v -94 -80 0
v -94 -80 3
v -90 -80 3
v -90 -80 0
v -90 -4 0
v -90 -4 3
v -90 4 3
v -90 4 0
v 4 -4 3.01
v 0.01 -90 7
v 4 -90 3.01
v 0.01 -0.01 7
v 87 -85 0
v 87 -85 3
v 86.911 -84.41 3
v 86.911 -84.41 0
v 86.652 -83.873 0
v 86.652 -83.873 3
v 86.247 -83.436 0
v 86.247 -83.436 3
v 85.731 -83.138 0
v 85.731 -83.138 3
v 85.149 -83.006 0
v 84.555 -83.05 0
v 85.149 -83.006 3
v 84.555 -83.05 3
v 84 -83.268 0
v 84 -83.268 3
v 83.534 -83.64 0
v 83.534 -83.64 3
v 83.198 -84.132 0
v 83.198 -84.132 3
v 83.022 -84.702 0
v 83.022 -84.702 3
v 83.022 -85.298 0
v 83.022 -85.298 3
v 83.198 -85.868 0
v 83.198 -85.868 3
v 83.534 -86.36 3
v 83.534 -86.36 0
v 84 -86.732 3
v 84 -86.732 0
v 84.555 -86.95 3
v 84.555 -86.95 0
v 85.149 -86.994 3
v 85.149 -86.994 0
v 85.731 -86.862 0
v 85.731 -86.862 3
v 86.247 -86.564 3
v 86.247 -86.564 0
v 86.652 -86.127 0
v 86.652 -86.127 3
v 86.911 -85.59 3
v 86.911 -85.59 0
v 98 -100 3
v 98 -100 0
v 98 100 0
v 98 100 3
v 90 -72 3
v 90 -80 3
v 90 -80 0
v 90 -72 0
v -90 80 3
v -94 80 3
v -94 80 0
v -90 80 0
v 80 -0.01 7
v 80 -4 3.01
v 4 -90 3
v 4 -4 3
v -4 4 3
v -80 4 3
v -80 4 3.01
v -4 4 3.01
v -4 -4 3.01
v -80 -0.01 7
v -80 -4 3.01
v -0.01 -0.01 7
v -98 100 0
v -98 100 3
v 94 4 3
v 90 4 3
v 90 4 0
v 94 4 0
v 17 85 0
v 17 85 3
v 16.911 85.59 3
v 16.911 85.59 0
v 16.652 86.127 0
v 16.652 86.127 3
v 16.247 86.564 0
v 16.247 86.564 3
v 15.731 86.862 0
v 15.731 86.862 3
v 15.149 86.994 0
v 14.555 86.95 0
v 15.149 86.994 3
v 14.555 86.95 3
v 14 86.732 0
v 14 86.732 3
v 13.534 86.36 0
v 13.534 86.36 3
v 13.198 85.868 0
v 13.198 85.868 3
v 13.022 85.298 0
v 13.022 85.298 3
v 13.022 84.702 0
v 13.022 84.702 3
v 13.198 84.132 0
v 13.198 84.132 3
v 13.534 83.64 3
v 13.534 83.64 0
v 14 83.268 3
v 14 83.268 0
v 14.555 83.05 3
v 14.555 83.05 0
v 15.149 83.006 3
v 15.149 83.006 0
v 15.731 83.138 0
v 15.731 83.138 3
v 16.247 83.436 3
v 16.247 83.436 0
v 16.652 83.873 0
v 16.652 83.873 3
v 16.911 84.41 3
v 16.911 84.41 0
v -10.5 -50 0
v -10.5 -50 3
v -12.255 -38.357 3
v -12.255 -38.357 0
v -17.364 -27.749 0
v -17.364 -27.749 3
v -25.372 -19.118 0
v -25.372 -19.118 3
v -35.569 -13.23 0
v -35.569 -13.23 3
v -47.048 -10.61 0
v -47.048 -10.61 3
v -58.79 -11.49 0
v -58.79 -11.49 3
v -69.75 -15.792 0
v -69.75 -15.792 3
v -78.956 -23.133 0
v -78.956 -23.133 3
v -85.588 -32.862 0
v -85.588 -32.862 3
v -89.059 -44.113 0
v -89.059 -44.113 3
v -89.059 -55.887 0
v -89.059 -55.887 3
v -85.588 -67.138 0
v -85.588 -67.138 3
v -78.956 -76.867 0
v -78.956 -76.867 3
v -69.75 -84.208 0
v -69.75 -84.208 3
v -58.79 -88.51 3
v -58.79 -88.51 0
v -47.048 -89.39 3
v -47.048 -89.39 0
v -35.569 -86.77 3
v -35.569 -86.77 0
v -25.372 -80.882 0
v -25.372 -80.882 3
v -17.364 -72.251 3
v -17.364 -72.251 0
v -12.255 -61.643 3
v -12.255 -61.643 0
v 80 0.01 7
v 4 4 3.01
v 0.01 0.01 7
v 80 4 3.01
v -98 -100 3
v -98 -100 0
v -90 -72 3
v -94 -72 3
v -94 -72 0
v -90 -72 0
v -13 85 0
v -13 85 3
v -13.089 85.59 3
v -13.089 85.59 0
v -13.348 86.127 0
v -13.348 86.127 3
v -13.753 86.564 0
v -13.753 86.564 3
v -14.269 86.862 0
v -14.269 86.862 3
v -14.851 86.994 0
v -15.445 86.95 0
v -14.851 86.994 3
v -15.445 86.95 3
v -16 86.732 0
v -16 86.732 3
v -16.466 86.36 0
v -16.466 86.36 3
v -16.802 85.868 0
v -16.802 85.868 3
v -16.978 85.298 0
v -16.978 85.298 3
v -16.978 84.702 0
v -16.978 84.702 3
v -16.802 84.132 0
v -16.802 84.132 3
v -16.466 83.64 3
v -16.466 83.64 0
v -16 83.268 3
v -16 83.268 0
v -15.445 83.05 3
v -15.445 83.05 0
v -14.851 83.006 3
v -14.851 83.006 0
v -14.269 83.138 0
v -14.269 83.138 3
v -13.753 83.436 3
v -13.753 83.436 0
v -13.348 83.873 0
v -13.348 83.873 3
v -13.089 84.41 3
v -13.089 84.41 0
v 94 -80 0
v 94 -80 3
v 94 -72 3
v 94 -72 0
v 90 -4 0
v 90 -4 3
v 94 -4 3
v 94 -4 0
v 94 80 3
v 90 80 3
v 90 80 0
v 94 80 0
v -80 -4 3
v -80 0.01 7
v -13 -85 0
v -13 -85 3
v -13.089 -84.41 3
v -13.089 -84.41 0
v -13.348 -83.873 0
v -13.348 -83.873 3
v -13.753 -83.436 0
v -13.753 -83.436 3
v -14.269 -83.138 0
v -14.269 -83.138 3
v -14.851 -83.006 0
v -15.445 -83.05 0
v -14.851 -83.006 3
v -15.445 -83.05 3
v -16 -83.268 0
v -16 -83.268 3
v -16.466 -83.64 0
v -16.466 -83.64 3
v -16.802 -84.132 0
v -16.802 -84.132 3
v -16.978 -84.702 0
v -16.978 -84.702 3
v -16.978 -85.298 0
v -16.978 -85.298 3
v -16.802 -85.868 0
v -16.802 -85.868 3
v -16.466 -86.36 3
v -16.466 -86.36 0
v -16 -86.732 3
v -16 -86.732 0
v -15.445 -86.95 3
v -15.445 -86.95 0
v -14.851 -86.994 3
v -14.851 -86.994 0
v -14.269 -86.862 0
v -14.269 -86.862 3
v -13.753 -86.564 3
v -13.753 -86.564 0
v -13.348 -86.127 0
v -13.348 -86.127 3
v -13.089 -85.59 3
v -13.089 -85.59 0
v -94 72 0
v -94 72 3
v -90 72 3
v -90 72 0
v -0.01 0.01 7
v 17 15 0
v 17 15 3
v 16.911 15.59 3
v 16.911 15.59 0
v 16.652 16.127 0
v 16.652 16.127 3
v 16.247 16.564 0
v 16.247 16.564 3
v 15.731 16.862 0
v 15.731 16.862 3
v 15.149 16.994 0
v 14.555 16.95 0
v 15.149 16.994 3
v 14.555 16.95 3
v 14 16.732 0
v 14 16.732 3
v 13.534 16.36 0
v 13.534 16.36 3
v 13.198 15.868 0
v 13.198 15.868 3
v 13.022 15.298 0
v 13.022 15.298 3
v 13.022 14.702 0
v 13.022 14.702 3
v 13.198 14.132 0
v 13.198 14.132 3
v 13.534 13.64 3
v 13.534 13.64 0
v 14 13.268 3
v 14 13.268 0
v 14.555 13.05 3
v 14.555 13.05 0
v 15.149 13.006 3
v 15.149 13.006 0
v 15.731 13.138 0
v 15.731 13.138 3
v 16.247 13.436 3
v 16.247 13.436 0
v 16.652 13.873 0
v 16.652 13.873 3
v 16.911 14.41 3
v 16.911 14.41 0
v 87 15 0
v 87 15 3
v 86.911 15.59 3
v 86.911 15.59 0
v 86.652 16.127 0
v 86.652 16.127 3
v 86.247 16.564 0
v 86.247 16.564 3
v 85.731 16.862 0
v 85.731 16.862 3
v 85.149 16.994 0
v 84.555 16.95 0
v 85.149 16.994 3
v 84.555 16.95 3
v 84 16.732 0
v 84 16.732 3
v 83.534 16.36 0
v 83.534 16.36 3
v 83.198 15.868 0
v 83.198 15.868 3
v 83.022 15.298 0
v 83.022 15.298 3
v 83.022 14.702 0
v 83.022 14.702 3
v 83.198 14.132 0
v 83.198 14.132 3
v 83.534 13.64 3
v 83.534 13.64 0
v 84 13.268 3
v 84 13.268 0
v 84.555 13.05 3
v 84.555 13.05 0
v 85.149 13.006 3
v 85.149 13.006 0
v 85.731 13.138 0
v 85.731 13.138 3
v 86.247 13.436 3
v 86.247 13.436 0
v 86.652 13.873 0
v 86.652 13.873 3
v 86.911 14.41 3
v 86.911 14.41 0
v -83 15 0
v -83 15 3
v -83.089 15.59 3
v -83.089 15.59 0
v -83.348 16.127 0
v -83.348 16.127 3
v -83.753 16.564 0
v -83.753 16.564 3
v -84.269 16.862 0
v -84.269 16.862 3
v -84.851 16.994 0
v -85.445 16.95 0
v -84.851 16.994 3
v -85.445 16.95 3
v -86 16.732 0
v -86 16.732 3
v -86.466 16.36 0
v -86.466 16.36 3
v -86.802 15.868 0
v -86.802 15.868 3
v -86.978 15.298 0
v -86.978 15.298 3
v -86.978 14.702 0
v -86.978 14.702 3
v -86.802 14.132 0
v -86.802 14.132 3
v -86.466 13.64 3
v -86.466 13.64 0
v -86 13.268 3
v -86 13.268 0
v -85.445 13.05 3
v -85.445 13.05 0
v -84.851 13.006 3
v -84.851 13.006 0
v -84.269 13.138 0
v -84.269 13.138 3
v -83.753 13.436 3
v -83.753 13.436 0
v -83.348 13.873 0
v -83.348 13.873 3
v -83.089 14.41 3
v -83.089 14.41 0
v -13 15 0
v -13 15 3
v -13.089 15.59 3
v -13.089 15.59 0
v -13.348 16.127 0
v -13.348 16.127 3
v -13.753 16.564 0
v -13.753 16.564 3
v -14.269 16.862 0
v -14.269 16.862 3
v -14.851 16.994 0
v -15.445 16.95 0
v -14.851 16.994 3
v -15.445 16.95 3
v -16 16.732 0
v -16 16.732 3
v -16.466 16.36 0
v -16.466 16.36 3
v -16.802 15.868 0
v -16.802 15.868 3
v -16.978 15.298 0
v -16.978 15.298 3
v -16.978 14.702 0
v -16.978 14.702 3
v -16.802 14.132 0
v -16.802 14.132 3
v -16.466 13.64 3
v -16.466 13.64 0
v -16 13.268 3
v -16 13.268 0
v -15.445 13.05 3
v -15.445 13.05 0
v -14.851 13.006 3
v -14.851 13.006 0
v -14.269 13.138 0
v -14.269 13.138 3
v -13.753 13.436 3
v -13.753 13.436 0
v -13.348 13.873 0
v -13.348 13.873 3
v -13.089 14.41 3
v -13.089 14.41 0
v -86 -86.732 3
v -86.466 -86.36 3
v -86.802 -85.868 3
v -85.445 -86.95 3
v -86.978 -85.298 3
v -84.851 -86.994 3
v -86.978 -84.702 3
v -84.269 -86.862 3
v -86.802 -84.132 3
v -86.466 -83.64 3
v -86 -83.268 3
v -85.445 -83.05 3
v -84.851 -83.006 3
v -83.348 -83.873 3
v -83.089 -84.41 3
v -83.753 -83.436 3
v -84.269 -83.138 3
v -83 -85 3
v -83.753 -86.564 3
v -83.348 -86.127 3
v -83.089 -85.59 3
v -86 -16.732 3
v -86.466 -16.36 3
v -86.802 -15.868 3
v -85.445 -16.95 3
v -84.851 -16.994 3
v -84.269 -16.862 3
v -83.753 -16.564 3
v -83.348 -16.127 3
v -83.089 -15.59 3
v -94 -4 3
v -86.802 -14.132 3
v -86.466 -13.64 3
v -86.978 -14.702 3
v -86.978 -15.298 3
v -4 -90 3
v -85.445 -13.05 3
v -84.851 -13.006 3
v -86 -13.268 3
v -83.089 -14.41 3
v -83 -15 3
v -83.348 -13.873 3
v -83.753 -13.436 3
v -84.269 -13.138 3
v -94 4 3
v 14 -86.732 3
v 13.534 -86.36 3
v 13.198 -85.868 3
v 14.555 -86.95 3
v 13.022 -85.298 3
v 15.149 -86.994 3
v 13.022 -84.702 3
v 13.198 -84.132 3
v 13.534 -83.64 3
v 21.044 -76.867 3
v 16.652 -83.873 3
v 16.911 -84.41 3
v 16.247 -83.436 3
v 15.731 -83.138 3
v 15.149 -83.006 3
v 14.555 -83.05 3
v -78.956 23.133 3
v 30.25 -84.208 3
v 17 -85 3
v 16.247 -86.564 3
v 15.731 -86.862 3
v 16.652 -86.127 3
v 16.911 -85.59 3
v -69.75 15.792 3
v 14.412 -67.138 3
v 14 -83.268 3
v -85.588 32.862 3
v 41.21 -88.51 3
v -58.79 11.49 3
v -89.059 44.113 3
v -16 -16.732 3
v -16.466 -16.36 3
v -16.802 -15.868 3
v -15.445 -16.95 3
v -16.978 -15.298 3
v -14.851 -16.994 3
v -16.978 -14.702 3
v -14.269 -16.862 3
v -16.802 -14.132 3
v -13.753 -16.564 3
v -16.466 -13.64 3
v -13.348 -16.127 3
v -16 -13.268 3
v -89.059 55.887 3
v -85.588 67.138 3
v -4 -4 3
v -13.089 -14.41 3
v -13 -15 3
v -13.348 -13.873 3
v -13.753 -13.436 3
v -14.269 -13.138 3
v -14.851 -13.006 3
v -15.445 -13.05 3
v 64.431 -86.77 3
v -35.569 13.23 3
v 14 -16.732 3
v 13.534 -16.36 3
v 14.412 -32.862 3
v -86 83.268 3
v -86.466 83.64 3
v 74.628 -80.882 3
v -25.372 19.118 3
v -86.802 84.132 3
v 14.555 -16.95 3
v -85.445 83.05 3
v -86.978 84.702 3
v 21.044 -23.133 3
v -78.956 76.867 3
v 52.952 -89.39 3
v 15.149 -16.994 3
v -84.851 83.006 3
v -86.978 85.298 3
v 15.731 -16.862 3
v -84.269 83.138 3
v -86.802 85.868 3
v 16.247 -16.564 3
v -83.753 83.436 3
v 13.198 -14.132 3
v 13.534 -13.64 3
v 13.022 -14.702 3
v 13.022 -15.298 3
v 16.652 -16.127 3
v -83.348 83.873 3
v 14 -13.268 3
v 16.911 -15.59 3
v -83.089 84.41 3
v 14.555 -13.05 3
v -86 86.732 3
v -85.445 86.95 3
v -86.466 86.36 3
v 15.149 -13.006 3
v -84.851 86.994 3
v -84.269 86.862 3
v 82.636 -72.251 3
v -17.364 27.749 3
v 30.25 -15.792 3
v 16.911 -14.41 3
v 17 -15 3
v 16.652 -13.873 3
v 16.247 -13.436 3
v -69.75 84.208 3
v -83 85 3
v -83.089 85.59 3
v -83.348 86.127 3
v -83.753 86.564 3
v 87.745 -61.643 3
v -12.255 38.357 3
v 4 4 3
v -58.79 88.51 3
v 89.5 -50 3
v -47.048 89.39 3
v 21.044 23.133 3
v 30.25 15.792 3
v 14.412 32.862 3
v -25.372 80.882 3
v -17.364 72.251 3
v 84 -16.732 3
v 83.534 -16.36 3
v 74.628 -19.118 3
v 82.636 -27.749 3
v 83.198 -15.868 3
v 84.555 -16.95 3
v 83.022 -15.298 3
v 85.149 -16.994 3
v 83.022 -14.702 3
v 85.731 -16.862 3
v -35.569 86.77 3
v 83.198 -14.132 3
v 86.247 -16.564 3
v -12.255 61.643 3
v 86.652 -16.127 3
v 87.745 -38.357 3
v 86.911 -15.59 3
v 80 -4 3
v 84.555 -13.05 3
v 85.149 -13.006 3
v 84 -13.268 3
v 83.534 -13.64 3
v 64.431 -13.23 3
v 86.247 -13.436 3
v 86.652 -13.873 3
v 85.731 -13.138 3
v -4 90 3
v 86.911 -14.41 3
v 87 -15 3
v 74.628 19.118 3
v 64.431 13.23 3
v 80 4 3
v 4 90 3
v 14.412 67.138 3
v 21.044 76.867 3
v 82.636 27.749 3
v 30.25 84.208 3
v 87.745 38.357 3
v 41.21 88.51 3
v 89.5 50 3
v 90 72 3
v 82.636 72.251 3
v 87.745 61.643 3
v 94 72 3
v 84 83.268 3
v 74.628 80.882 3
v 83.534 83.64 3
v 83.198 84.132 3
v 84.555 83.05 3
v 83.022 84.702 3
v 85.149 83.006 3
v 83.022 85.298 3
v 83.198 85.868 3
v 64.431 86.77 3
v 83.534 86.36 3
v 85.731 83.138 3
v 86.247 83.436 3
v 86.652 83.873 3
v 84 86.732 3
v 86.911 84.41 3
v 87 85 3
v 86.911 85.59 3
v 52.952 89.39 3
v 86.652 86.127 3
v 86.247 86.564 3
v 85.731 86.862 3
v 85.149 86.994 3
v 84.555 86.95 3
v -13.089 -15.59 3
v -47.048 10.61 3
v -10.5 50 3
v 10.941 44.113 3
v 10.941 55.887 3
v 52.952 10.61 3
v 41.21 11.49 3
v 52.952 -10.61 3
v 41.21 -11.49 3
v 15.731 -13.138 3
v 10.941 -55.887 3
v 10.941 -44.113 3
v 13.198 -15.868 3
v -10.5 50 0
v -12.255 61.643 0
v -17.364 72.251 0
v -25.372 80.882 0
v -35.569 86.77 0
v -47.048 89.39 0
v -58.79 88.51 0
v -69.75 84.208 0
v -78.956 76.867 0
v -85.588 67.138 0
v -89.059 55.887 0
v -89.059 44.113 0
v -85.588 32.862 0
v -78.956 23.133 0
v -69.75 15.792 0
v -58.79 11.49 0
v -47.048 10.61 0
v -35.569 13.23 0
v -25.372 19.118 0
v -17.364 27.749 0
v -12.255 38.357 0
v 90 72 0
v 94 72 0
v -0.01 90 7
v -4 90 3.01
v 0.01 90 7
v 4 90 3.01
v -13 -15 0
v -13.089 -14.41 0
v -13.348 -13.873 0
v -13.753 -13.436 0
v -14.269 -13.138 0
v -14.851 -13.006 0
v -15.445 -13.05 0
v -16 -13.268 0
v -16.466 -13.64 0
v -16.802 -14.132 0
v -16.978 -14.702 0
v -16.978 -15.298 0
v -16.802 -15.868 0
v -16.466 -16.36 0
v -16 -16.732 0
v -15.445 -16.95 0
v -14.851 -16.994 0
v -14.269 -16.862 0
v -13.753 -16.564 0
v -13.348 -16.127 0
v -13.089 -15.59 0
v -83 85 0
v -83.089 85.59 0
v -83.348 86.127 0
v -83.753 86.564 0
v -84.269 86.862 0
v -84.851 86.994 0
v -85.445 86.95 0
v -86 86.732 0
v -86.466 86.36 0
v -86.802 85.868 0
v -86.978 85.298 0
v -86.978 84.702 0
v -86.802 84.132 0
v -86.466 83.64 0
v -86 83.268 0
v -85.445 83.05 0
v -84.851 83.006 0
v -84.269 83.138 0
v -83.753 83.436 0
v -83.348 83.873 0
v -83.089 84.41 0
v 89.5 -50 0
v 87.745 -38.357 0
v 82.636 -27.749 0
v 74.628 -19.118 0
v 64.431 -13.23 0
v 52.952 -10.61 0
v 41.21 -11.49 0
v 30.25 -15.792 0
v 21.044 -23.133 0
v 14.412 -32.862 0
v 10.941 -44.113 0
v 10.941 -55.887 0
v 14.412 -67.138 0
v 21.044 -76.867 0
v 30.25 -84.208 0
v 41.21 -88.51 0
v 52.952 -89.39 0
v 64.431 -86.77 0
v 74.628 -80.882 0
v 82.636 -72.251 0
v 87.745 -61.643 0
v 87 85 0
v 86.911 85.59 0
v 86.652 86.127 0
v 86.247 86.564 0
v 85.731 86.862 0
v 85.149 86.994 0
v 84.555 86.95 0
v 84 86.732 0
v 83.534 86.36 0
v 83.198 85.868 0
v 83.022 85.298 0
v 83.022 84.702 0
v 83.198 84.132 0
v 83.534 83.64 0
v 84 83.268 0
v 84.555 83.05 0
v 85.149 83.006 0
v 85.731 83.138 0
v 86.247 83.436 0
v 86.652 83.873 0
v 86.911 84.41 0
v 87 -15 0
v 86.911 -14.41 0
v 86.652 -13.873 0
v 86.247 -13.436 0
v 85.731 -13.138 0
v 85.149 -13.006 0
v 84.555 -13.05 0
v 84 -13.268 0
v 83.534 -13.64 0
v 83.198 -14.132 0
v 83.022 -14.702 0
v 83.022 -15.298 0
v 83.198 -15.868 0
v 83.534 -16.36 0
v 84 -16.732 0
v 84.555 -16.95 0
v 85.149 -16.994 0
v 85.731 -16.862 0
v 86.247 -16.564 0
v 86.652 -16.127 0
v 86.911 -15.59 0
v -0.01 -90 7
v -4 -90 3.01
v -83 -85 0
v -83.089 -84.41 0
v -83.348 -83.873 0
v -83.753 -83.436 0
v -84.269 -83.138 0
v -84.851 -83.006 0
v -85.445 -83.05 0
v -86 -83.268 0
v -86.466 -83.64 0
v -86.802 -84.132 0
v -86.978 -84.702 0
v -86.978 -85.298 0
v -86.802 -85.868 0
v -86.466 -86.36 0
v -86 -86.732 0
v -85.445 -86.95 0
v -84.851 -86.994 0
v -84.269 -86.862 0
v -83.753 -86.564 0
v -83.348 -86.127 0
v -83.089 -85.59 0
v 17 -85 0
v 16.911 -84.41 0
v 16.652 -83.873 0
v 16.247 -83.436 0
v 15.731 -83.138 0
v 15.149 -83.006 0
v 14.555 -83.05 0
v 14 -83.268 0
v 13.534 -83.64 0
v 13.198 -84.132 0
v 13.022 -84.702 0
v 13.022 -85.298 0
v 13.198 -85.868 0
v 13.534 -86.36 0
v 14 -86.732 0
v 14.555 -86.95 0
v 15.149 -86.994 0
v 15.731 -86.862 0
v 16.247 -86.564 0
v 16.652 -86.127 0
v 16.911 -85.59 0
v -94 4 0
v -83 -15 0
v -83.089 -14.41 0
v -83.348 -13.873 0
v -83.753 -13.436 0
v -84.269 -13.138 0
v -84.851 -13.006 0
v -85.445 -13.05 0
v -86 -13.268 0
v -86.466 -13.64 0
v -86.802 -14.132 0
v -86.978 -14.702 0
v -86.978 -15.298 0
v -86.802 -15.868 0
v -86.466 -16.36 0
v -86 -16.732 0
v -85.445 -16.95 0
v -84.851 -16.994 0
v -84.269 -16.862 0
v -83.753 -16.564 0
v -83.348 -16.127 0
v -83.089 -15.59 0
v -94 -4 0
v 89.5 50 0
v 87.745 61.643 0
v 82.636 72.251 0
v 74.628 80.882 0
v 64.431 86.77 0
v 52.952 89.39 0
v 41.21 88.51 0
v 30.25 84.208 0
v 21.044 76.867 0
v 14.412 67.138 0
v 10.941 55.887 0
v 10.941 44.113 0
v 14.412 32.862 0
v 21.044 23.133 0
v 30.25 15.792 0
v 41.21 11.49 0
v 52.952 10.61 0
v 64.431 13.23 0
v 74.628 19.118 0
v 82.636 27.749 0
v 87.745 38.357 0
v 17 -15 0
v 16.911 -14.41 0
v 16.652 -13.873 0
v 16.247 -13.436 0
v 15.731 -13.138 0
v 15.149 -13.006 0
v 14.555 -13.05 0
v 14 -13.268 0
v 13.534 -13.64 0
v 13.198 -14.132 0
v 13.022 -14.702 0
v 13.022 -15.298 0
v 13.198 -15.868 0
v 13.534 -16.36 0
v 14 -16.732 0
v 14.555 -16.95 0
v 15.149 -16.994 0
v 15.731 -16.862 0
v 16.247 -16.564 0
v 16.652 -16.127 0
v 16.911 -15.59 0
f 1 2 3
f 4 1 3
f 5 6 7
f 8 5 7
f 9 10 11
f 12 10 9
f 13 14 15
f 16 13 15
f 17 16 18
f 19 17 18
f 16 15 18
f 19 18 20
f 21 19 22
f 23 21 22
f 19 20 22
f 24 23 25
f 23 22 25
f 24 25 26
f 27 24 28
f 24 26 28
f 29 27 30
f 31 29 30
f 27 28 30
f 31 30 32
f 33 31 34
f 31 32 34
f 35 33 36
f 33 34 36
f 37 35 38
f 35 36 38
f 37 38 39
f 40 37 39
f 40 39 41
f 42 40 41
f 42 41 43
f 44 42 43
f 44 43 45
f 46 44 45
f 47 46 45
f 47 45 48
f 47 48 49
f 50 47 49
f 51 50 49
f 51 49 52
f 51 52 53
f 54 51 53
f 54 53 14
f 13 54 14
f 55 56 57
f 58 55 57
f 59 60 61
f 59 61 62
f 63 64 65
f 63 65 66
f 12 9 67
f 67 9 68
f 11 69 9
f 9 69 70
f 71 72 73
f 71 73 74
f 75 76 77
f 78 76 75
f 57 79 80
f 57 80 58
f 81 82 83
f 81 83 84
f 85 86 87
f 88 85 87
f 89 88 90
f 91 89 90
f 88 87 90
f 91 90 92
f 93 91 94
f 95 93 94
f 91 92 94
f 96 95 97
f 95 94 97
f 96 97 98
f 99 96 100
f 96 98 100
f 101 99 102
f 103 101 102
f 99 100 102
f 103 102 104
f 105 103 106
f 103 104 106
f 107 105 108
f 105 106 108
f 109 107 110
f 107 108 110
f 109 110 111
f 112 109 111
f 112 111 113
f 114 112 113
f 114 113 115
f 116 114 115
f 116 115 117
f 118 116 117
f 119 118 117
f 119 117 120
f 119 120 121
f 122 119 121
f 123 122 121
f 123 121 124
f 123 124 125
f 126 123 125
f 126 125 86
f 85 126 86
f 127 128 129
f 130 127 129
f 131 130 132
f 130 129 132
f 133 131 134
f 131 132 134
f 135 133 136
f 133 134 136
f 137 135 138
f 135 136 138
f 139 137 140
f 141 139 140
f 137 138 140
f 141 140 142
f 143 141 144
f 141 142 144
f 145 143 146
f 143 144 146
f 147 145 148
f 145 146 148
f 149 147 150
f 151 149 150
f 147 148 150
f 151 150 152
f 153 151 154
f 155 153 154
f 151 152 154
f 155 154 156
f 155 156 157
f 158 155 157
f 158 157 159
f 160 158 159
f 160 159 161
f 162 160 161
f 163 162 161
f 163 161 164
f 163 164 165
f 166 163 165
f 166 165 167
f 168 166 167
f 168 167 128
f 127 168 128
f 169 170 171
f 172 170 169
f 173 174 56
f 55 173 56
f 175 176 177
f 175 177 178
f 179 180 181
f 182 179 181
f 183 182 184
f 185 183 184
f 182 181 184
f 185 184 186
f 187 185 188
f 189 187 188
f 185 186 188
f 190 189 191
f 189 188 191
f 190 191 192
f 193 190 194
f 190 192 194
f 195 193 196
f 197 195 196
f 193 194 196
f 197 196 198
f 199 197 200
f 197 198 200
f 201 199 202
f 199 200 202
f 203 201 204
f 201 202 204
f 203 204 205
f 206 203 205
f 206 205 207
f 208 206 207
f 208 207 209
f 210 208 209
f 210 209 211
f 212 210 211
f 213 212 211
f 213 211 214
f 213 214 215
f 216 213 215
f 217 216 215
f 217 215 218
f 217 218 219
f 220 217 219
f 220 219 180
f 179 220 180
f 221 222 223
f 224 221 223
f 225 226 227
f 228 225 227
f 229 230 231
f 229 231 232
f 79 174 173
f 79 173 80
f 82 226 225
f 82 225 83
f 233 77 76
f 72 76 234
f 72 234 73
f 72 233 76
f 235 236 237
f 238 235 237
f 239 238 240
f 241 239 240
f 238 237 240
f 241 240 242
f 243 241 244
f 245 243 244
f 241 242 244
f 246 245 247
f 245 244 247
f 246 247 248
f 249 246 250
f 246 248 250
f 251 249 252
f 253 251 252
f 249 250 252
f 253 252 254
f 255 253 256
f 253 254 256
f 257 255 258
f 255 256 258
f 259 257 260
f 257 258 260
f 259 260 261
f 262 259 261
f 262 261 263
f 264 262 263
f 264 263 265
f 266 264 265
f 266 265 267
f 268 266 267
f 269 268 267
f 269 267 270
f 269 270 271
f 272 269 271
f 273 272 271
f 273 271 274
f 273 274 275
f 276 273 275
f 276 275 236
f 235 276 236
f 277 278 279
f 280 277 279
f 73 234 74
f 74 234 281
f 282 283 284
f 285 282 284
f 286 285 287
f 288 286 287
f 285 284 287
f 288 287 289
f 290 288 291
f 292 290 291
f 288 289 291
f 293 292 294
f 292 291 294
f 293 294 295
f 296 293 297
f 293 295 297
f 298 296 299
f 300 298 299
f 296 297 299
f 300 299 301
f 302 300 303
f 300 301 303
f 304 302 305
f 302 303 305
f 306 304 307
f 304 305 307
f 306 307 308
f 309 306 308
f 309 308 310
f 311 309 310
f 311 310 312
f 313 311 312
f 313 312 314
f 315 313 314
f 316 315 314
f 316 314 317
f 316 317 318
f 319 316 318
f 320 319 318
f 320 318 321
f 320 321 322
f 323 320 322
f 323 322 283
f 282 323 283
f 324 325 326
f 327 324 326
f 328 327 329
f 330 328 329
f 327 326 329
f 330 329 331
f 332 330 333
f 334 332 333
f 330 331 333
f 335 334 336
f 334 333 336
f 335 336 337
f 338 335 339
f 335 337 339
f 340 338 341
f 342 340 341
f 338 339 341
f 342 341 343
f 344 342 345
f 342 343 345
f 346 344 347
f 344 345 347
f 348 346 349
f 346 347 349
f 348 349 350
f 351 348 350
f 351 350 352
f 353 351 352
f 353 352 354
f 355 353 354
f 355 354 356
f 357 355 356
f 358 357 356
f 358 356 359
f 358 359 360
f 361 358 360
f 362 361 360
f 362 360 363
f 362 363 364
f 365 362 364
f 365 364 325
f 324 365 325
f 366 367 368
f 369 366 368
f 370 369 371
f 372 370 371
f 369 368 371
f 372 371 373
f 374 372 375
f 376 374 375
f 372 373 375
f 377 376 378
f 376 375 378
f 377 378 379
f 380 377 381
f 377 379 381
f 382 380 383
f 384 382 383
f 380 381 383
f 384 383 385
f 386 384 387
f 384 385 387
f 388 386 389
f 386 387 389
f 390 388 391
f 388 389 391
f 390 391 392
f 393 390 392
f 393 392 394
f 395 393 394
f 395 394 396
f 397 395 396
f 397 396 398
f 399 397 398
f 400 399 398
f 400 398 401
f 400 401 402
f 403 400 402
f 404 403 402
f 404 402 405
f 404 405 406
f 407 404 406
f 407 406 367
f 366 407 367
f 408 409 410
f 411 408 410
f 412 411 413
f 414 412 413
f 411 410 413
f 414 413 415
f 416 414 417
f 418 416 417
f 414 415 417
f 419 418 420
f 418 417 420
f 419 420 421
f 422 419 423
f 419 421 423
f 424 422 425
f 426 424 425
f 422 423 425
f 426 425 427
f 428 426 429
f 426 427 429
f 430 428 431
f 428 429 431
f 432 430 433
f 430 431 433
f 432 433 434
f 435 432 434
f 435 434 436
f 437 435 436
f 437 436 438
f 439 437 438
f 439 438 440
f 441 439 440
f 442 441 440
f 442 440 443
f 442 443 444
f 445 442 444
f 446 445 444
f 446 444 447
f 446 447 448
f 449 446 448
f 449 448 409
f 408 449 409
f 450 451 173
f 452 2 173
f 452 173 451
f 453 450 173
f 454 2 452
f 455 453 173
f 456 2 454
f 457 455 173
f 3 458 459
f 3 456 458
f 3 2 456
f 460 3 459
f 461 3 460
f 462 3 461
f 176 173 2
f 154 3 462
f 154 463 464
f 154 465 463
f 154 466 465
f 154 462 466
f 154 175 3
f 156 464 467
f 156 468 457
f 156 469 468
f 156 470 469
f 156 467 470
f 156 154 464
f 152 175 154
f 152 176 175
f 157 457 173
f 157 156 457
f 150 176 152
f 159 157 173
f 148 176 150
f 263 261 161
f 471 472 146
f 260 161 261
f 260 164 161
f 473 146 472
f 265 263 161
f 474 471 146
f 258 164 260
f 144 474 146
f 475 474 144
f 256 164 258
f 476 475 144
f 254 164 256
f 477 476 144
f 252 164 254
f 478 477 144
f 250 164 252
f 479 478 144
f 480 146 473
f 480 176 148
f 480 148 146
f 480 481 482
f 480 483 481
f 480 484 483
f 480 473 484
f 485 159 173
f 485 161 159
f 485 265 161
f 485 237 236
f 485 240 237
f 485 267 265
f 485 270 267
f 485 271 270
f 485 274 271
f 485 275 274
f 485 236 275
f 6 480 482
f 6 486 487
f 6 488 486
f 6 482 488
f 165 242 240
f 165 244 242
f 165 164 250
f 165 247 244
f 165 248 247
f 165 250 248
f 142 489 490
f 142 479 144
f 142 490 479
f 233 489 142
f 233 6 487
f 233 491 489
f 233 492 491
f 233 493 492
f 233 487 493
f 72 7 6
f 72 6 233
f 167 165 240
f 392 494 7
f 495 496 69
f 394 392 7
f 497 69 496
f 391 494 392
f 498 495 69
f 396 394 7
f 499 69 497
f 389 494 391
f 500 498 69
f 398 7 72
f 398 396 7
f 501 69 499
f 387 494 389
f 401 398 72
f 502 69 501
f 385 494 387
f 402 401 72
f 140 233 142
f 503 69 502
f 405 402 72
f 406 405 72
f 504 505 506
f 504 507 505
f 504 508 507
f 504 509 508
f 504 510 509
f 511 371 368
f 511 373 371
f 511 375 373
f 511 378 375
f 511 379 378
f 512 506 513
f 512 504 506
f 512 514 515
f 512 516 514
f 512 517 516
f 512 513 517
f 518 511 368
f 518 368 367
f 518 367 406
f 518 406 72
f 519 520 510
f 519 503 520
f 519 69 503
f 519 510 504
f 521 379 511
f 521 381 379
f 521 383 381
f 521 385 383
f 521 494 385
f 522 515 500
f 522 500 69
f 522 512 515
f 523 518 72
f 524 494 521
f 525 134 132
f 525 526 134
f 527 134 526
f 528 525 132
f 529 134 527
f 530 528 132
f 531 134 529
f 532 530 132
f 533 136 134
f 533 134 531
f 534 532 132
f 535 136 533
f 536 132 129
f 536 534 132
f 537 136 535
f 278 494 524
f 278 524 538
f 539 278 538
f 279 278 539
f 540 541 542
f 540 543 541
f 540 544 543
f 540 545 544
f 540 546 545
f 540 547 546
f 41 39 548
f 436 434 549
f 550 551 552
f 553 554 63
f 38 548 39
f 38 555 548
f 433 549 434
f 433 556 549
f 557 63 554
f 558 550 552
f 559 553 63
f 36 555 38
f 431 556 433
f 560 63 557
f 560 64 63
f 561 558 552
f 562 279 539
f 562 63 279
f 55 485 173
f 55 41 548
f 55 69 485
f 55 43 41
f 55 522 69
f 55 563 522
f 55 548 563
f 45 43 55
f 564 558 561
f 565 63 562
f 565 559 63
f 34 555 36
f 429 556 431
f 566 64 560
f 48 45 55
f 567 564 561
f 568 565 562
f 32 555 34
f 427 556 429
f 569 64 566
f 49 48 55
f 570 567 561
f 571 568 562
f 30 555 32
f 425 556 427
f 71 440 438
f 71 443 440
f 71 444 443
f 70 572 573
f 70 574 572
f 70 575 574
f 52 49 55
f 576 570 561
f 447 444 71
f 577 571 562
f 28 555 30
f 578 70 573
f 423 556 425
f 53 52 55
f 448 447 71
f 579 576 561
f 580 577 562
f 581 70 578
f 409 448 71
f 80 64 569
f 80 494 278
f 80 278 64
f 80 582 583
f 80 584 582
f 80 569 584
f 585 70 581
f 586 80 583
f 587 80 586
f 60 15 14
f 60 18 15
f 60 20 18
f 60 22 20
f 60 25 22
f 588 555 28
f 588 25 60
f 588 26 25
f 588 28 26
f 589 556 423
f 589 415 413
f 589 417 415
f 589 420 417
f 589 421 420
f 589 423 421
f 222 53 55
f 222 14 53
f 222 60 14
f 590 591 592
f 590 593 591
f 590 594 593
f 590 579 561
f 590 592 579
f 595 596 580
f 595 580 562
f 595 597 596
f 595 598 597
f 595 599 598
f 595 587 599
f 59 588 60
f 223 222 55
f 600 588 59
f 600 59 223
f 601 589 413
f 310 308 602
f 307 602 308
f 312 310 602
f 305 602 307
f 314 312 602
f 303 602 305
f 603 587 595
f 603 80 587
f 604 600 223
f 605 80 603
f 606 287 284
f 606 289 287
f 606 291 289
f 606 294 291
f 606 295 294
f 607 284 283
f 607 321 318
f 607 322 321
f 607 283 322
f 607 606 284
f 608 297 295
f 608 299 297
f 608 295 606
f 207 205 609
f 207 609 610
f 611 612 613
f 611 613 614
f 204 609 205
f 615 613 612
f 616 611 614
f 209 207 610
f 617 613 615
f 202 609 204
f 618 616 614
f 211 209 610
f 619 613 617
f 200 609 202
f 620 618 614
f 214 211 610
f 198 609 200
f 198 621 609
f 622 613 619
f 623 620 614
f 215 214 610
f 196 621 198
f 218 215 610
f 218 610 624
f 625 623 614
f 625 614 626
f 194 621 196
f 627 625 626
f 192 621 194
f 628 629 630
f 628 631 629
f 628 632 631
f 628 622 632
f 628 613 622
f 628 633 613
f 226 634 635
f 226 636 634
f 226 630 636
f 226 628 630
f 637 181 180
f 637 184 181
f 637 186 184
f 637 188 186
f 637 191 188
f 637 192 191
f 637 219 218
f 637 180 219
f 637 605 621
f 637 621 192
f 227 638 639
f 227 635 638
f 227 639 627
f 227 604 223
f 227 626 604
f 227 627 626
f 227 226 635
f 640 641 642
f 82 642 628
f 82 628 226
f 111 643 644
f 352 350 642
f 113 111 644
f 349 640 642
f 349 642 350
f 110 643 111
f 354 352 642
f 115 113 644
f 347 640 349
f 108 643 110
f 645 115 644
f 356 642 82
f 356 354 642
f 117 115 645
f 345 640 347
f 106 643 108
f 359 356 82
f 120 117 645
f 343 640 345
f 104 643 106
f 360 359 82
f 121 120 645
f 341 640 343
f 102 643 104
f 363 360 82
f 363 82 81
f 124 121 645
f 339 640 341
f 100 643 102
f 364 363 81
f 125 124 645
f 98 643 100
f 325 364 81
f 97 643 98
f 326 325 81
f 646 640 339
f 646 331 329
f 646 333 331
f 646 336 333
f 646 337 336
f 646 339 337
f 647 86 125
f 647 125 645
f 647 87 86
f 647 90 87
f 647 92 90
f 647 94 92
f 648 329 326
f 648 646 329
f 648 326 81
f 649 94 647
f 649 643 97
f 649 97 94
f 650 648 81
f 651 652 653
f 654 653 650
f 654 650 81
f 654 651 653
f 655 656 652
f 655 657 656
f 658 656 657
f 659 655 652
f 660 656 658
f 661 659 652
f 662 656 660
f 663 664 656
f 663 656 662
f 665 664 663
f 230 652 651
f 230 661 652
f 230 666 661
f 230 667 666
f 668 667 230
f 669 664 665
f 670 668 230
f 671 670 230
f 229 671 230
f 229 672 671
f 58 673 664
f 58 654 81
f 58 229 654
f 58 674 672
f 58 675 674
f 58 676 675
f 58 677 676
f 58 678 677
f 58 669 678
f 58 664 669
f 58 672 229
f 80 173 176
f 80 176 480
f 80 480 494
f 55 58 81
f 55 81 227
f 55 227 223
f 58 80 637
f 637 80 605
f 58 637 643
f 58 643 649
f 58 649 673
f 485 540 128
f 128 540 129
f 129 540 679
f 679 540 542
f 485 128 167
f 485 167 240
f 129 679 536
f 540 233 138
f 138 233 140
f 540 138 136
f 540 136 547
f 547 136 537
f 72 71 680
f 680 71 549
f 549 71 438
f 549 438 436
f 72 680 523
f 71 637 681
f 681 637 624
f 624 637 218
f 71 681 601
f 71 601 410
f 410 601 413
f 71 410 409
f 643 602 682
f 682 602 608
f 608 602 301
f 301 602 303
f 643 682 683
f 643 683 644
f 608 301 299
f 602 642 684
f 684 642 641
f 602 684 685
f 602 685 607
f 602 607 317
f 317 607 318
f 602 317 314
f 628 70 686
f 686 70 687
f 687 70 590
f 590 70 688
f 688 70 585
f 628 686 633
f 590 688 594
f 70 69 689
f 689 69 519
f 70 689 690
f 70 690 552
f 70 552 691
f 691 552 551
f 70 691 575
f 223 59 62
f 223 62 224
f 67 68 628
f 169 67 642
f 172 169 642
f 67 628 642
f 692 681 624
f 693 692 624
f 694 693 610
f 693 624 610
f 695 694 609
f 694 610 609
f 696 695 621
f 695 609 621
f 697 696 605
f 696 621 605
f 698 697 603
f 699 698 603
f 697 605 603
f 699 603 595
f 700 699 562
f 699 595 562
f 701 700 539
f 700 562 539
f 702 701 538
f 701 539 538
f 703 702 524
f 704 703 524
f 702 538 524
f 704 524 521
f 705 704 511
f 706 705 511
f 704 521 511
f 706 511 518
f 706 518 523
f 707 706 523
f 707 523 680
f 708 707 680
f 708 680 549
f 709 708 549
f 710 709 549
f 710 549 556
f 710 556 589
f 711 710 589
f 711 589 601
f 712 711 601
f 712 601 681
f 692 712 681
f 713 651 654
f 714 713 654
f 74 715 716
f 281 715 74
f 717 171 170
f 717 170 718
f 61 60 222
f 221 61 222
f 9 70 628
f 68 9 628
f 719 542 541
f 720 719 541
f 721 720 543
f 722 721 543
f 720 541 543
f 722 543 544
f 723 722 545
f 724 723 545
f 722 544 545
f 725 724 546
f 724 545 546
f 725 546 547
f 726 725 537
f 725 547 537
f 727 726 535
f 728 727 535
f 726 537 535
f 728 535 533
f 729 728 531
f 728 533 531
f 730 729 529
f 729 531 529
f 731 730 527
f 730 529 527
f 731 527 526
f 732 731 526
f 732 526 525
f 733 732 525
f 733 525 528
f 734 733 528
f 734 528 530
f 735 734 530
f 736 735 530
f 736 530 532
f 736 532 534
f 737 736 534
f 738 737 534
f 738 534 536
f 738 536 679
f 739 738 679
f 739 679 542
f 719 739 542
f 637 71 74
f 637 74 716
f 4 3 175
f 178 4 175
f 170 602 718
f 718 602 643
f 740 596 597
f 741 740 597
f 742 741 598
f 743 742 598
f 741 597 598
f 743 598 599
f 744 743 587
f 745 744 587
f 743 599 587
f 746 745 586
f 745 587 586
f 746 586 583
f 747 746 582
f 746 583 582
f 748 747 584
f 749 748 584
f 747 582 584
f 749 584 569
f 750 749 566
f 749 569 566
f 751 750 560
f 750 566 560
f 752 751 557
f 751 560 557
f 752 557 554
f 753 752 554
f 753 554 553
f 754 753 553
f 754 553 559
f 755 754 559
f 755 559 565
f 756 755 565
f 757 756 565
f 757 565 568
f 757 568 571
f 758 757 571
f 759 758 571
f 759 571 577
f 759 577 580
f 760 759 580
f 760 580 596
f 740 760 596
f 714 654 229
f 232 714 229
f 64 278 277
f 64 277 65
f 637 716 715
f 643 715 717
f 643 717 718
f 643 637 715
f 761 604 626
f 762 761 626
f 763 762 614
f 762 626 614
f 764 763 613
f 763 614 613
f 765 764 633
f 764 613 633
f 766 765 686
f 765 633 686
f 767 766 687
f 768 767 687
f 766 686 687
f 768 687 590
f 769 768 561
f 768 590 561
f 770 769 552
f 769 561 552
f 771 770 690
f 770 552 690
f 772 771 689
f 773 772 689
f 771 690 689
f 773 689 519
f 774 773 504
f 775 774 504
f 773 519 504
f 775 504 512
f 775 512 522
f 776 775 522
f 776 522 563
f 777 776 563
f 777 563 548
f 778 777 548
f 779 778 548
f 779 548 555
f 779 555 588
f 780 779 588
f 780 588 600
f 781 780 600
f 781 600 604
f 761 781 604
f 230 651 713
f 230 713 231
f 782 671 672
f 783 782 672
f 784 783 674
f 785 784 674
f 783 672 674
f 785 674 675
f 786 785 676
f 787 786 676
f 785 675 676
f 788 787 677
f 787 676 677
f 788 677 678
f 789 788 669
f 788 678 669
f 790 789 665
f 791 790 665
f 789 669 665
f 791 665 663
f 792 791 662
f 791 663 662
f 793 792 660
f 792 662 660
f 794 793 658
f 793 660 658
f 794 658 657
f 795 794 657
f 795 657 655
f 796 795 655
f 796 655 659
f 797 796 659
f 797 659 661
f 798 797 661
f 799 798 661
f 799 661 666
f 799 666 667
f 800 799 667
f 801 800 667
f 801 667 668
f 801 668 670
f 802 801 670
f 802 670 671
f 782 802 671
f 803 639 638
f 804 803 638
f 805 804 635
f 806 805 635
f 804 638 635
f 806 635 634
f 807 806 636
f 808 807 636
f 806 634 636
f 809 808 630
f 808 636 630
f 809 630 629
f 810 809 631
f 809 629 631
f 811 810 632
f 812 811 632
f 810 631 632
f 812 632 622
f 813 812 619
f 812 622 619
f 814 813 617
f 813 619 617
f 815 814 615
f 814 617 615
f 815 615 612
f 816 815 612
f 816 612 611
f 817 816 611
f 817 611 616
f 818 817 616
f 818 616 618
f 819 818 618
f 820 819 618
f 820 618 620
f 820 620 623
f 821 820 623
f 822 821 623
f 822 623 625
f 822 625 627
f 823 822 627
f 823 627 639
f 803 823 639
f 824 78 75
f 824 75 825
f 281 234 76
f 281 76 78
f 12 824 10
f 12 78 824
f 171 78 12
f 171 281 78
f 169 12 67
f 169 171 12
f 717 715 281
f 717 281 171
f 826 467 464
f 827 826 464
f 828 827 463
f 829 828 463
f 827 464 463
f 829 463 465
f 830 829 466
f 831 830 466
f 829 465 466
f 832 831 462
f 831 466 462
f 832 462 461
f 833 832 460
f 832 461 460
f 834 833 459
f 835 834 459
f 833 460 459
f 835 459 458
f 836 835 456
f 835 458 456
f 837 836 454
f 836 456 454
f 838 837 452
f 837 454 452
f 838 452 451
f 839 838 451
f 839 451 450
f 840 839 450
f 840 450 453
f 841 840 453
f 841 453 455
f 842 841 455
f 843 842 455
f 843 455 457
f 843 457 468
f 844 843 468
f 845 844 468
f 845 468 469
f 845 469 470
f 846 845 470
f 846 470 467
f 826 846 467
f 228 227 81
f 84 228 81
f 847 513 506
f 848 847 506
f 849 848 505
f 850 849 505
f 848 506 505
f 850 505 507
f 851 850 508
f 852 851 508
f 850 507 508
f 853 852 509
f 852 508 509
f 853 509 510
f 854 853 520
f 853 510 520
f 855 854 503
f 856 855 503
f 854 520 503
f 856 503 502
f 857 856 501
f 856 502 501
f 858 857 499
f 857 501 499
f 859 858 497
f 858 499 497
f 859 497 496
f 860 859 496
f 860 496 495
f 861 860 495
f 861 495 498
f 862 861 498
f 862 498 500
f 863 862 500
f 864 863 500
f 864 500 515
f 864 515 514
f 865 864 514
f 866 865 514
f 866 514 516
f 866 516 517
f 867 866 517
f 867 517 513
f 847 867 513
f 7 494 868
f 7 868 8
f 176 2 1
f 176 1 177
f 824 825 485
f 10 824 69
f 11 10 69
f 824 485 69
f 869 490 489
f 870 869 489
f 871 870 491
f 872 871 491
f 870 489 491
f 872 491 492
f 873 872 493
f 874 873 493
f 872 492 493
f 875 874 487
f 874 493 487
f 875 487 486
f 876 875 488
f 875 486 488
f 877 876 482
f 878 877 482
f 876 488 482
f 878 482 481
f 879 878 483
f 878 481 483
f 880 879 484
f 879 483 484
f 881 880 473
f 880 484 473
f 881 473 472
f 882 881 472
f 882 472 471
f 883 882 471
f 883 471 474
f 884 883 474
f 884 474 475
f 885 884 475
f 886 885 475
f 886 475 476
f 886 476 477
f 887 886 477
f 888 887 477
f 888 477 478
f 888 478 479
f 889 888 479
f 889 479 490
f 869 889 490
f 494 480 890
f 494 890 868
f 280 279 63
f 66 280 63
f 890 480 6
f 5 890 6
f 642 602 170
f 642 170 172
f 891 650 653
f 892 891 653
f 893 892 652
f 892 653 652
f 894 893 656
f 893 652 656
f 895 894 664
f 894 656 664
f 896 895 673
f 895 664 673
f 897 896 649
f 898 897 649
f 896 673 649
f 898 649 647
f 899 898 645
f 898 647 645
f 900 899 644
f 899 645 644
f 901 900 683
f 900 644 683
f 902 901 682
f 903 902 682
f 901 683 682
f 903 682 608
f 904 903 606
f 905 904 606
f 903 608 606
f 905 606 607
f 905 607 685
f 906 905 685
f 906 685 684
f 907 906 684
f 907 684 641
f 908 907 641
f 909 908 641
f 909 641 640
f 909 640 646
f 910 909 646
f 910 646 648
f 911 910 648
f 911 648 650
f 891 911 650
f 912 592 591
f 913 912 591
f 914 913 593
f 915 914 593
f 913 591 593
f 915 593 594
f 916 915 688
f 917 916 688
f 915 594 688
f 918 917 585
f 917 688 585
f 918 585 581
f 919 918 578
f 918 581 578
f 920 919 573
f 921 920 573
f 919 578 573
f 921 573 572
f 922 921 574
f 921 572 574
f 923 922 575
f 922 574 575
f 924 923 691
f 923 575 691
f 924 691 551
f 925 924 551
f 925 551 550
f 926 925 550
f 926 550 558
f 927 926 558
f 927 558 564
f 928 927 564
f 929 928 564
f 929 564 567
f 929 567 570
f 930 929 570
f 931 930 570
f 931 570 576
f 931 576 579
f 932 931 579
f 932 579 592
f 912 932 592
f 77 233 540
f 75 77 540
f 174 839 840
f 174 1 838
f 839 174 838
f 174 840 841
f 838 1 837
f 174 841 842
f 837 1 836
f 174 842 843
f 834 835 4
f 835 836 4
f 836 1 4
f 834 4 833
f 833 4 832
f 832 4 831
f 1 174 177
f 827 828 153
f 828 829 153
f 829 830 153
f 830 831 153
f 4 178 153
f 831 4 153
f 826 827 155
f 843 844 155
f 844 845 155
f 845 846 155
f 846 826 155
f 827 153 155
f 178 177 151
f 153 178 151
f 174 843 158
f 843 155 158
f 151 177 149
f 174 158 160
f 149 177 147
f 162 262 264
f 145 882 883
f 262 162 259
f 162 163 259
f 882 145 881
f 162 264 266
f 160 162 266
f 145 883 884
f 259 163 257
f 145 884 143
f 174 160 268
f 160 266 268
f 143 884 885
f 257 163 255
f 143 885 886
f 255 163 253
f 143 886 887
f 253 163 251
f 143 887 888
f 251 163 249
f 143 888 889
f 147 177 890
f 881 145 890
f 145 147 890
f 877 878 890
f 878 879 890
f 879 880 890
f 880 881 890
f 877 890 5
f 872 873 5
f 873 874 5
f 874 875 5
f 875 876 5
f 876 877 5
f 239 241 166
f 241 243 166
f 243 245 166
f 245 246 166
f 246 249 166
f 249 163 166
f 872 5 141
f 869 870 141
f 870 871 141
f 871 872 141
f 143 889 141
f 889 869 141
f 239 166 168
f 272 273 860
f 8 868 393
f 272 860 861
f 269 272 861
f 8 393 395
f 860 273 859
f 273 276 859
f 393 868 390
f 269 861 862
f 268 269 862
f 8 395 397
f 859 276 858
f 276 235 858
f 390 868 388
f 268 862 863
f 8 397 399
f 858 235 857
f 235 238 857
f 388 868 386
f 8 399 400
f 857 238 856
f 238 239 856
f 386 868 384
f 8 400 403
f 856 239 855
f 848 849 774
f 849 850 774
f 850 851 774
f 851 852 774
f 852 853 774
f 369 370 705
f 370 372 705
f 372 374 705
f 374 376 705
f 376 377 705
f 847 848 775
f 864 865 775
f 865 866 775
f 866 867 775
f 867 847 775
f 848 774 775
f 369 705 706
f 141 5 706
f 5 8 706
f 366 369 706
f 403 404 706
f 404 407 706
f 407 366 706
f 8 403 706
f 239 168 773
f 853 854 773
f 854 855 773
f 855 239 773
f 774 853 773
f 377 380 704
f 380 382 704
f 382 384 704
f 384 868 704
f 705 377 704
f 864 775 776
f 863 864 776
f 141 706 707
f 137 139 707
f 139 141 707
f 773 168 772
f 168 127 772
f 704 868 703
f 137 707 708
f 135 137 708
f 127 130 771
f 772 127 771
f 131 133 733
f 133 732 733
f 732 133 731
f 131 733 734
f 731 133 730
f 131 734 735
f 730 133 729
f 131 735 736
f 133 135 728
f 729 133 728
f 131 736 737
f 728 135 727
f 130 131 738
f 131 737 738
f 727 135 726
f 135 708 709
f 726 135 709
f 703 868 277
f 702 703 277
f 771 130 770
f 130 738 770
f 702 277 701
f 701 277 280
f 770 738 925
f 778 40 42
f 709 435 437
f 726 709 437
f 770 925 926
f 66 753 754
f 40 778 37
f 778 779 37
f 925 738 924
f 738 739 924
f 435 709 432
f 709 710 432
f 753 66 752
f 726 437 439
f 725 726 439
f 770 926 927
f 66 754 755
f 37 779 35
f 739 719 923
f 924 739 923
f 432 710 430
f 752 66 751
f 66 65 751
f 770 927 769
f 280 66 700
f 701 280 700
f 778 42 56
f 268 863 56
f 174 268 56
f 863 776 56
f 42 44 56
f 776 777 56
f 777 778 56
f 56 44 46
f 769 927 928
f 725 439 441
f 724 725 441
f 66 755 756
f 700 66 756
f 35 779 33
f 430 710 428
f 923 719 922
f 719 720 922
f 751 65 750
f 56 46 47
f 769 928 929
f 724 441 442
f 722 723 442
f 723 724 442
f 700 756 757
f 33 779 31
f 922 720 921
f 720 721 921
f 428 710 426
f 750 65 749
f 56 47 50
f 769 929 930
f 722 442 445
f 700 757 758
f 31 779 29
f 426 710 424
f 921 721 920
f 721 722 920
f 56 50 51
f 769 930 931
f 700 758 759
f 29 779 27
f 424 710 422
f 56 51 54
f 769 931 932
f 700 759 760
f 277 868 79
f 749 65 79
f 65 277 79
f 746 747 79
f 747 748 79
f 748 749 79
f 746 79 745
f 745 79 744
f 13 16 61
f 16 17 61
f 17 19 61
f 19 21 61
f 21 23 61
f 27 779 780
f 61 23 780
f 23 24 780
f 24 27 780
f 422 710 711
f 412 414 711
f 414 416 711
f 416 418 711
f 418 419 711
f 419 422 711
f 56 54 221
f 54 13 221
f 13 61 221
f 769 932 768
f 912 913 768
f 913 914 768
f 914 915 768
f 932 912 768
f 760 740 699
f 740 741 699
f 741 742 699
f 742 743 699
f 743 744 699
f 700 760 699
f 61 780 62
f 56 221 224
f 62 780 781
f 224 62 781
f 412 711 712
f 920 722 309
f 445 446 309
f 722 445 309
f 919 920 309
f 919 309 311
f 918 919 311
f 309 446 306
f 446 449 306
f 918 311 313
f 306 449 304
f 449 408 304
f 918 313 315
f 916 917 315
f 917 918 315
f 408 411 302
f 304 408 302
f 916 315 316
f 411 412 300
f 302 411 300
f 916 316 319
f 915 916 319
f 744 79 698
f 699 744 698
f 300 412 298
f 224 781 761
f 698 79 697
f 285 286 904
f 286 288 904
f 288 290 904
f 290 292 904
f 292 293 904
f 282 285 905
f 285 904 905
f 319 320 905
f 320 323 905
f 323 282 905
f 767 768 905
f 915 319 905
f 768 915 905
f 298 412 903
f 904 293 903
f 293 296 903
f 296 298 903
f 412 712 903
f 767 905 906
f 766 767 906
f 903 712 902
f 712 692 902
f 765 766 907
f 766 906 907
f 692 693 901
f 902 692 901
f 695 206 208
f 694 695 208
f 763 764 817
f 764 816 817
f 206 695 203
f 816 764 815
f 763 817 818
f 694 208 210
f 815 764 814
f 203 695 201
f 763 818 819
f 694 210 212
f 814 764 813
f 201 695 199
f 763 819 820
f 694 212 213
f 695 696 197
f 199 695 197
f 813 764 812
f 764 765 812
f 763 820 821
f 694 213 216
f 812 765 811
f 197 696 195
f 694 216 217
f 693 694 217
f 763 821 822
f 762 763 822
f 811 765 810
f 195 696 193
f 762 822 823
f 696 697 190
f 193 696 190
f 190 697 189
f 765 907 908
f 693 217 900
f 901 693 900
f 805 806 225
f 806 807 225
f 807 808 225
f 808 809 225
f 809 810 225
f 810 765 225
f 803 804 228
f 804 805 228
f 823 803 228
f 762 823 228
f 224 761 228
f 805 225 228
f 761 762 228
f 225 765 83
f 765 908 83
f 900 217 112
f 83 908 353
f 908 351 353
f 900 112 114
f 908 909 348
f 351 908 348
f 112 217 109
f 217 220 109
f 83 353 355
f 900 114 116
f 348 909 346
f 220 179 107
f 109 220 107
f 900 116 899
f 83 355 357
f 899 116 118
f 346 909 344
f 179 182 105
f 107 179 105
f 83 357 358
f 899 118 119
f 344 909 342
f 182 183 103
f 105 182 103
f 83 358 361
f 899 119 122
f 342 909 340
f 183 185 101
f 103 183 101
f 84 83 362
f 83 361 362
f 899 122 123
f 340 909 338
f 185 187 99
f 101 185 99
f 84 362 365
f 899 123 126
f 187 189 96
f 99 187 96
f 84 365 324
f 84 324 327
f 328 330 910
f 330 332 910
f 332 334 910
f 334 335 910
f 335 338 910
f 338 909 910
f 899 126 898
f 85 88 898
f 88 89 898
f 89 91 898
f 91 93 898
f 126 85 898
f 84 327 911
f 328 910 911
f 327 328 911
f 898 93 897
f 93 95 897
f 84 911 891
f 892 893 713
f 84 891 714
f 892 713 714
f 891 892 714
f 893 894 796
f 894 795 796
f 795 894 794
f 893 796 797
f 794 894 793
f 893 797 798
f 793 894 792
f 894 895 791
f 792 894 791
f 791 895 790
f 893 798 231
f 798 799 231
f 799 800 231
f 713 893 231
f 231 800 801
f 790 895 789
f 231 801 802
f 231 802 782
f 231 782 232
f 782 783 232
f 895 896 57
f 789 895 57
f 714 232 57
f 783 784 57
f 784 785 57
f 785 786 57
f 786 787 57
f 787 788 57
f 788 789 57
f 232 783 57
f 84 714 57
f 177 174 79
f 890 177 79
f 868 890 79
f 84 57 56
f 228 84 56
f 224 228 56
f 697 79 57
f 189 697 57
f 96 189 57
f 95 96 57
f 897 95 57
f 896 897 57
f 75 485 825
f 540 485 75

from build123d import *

# Parameters (mm, degrees)
SKETCH_W        = 196
SKETCH_H        = 200
PAD_DEPTH       = 3
SKETCH001_R     = 39.5
SKETCH001_R_2   = 2
POCKET_DEPTH    = 5
SKETCH002_W     = 4
SKETCH002_H     = 8
POCKET001_DEPTH = 5
SKETCH003_W     = 8
SKETCH003_H     = 180
PAD001_DEPTH    = 4
SKETCH004_W     = 160
SKETCH004_H     = 8
PAD002_DEPTH    = 4
CHAMFER_SIZE    = 3.99
CHAMFER001_SIZE = 3.99


with BuildPart() as part:
    # Sketch → Pad (new body)
    with BuildSketch(Plane.XY):
        Rectangle(SKETCH_W, SKETCH_H)
    extrude(amount=PAD_DEPTH)

    # Sketch001 (on Face6 of Pad) → Pocket (cut)
    with BuildSketch(Plane.XY.offset(3)):
        with Locations((-50, 50)):
            Circle(SKETCH001_R)
        with Locations((50, 50)):
            Circle(SKETCH001_R)
        with Locations((50, -50)):
            Circle(SKETCH001_R)
        with Locations((-50, -50)):
            Circle(SKETCH001_R)
        with Locations((-85, 85)):
            Circle(SKETCH001_R_2)
        with Locations((-15, 85)):
            Circle(SKETCH001_R_2)
        with Locations((-85, 15)):
            Circle(SKETCH001_R_2)
        with Locations((-15, 15)):
            Circle(SKETCH001_R_2)
        with Locations((15, 15)):
            Circle(SKETCH001_R_2)
        with Locations((15, 85)):
            Circle(SKETCH001_R_2)
        with Locations((85, 85)):
            Circle(SKETCH001_R_2)
        with Locations((85, 15)):
            Circle(SKETCH001_R_2)
        with Locations((85, -15)):
            Circle(SKETCH001_R_2)
        with Locations((15, -15)):
            Circle(SKETCH001_R_2)
        with Locations((15, -85)):
            Circle(SKETCH001_R_2)
        with Locations((85, -85)):
            Circle(SKETCH001_R_2)
        with Locations((-15, -85)):
            Circle(SKETCH001_R_2)
        with Locations((-85, -15)):
            Circle(SKETCH001_R_2)
        with Locations((-15, -15)):
            Circle(SKETCH001_R_2)
        with Locations((-85, -85)):
            Circle(SKETCH001_R_2)
    extrude(amount=-POCKET_DEPTH, mode=Mode.SUBTRACT)

    # Sketch002 (on Face5 of Pocket) → Pocket001 (cut)
    with BuildSketch(Plane.XY.offset(3)):
        with Locations((92, 76)):
            Rectangle(SKETCH002_W, SKETCH002_H)
        with Locations((92, -76)):
            Rectangle(SKETCH002_W, SKETCH002_H)
        with Locations((92, 0)):
            Rectangle(SKETCH002_W, SKETCH002_H)
        with Locations((-92, 0)):
            Rectangle(SKETCH002_W, SKETCH002_H)
        with Locations((-92, 76)):
            Rectangle(SKETCH002_W, SKETCH002_H)
        with Locations((-92, -76)):
            Rectangle(SKETCH002_W, SKETCH002_H)
    extrude(amount=-POCKET001_DEPTH, mode=Mode.SUBTRACT)

    # Sketch003 (on Face5 of Pocket001) → Pad001 (join)
    with BuildSketch(Plane.XY.offset(3)):
        Rectangle(SKETCH003_W, SKETCH003_H)
    extrude(amount=PAD001_DEPTH)

    # Sketch004 (on Face5 of Pad001) → Pad002 (join)
    with BuildSketch(Plane.XY.offset(3)):
        Rectangle(SKETCH004_W, SKETCH004_H)
    extrude(amount=PAD002_DEPTH)

    # Chamfer
    chamfer_edges = [part.edges().sort_by_distance(p)[0] for p in [
        (-42, -4, 7),
        (-42, 4, 7),
        (42, 4, 7),
        (42, -4, 7),
    ]]
    chamfer(chamfer_edges, length=CHAMFER_SIZE)

    # Chamfer001
    chamfer001_edges = [part.edges().sort_by_distance(p)[0] for p in [
        (-4, 47, 7),
        (4, 47, 7),
        (4, -47, 7),
        (-4, -47, 7),
    ]]
    chamfer(chamfer001_edges, length=CHAMFER001_SIZE)


solid = part.part
